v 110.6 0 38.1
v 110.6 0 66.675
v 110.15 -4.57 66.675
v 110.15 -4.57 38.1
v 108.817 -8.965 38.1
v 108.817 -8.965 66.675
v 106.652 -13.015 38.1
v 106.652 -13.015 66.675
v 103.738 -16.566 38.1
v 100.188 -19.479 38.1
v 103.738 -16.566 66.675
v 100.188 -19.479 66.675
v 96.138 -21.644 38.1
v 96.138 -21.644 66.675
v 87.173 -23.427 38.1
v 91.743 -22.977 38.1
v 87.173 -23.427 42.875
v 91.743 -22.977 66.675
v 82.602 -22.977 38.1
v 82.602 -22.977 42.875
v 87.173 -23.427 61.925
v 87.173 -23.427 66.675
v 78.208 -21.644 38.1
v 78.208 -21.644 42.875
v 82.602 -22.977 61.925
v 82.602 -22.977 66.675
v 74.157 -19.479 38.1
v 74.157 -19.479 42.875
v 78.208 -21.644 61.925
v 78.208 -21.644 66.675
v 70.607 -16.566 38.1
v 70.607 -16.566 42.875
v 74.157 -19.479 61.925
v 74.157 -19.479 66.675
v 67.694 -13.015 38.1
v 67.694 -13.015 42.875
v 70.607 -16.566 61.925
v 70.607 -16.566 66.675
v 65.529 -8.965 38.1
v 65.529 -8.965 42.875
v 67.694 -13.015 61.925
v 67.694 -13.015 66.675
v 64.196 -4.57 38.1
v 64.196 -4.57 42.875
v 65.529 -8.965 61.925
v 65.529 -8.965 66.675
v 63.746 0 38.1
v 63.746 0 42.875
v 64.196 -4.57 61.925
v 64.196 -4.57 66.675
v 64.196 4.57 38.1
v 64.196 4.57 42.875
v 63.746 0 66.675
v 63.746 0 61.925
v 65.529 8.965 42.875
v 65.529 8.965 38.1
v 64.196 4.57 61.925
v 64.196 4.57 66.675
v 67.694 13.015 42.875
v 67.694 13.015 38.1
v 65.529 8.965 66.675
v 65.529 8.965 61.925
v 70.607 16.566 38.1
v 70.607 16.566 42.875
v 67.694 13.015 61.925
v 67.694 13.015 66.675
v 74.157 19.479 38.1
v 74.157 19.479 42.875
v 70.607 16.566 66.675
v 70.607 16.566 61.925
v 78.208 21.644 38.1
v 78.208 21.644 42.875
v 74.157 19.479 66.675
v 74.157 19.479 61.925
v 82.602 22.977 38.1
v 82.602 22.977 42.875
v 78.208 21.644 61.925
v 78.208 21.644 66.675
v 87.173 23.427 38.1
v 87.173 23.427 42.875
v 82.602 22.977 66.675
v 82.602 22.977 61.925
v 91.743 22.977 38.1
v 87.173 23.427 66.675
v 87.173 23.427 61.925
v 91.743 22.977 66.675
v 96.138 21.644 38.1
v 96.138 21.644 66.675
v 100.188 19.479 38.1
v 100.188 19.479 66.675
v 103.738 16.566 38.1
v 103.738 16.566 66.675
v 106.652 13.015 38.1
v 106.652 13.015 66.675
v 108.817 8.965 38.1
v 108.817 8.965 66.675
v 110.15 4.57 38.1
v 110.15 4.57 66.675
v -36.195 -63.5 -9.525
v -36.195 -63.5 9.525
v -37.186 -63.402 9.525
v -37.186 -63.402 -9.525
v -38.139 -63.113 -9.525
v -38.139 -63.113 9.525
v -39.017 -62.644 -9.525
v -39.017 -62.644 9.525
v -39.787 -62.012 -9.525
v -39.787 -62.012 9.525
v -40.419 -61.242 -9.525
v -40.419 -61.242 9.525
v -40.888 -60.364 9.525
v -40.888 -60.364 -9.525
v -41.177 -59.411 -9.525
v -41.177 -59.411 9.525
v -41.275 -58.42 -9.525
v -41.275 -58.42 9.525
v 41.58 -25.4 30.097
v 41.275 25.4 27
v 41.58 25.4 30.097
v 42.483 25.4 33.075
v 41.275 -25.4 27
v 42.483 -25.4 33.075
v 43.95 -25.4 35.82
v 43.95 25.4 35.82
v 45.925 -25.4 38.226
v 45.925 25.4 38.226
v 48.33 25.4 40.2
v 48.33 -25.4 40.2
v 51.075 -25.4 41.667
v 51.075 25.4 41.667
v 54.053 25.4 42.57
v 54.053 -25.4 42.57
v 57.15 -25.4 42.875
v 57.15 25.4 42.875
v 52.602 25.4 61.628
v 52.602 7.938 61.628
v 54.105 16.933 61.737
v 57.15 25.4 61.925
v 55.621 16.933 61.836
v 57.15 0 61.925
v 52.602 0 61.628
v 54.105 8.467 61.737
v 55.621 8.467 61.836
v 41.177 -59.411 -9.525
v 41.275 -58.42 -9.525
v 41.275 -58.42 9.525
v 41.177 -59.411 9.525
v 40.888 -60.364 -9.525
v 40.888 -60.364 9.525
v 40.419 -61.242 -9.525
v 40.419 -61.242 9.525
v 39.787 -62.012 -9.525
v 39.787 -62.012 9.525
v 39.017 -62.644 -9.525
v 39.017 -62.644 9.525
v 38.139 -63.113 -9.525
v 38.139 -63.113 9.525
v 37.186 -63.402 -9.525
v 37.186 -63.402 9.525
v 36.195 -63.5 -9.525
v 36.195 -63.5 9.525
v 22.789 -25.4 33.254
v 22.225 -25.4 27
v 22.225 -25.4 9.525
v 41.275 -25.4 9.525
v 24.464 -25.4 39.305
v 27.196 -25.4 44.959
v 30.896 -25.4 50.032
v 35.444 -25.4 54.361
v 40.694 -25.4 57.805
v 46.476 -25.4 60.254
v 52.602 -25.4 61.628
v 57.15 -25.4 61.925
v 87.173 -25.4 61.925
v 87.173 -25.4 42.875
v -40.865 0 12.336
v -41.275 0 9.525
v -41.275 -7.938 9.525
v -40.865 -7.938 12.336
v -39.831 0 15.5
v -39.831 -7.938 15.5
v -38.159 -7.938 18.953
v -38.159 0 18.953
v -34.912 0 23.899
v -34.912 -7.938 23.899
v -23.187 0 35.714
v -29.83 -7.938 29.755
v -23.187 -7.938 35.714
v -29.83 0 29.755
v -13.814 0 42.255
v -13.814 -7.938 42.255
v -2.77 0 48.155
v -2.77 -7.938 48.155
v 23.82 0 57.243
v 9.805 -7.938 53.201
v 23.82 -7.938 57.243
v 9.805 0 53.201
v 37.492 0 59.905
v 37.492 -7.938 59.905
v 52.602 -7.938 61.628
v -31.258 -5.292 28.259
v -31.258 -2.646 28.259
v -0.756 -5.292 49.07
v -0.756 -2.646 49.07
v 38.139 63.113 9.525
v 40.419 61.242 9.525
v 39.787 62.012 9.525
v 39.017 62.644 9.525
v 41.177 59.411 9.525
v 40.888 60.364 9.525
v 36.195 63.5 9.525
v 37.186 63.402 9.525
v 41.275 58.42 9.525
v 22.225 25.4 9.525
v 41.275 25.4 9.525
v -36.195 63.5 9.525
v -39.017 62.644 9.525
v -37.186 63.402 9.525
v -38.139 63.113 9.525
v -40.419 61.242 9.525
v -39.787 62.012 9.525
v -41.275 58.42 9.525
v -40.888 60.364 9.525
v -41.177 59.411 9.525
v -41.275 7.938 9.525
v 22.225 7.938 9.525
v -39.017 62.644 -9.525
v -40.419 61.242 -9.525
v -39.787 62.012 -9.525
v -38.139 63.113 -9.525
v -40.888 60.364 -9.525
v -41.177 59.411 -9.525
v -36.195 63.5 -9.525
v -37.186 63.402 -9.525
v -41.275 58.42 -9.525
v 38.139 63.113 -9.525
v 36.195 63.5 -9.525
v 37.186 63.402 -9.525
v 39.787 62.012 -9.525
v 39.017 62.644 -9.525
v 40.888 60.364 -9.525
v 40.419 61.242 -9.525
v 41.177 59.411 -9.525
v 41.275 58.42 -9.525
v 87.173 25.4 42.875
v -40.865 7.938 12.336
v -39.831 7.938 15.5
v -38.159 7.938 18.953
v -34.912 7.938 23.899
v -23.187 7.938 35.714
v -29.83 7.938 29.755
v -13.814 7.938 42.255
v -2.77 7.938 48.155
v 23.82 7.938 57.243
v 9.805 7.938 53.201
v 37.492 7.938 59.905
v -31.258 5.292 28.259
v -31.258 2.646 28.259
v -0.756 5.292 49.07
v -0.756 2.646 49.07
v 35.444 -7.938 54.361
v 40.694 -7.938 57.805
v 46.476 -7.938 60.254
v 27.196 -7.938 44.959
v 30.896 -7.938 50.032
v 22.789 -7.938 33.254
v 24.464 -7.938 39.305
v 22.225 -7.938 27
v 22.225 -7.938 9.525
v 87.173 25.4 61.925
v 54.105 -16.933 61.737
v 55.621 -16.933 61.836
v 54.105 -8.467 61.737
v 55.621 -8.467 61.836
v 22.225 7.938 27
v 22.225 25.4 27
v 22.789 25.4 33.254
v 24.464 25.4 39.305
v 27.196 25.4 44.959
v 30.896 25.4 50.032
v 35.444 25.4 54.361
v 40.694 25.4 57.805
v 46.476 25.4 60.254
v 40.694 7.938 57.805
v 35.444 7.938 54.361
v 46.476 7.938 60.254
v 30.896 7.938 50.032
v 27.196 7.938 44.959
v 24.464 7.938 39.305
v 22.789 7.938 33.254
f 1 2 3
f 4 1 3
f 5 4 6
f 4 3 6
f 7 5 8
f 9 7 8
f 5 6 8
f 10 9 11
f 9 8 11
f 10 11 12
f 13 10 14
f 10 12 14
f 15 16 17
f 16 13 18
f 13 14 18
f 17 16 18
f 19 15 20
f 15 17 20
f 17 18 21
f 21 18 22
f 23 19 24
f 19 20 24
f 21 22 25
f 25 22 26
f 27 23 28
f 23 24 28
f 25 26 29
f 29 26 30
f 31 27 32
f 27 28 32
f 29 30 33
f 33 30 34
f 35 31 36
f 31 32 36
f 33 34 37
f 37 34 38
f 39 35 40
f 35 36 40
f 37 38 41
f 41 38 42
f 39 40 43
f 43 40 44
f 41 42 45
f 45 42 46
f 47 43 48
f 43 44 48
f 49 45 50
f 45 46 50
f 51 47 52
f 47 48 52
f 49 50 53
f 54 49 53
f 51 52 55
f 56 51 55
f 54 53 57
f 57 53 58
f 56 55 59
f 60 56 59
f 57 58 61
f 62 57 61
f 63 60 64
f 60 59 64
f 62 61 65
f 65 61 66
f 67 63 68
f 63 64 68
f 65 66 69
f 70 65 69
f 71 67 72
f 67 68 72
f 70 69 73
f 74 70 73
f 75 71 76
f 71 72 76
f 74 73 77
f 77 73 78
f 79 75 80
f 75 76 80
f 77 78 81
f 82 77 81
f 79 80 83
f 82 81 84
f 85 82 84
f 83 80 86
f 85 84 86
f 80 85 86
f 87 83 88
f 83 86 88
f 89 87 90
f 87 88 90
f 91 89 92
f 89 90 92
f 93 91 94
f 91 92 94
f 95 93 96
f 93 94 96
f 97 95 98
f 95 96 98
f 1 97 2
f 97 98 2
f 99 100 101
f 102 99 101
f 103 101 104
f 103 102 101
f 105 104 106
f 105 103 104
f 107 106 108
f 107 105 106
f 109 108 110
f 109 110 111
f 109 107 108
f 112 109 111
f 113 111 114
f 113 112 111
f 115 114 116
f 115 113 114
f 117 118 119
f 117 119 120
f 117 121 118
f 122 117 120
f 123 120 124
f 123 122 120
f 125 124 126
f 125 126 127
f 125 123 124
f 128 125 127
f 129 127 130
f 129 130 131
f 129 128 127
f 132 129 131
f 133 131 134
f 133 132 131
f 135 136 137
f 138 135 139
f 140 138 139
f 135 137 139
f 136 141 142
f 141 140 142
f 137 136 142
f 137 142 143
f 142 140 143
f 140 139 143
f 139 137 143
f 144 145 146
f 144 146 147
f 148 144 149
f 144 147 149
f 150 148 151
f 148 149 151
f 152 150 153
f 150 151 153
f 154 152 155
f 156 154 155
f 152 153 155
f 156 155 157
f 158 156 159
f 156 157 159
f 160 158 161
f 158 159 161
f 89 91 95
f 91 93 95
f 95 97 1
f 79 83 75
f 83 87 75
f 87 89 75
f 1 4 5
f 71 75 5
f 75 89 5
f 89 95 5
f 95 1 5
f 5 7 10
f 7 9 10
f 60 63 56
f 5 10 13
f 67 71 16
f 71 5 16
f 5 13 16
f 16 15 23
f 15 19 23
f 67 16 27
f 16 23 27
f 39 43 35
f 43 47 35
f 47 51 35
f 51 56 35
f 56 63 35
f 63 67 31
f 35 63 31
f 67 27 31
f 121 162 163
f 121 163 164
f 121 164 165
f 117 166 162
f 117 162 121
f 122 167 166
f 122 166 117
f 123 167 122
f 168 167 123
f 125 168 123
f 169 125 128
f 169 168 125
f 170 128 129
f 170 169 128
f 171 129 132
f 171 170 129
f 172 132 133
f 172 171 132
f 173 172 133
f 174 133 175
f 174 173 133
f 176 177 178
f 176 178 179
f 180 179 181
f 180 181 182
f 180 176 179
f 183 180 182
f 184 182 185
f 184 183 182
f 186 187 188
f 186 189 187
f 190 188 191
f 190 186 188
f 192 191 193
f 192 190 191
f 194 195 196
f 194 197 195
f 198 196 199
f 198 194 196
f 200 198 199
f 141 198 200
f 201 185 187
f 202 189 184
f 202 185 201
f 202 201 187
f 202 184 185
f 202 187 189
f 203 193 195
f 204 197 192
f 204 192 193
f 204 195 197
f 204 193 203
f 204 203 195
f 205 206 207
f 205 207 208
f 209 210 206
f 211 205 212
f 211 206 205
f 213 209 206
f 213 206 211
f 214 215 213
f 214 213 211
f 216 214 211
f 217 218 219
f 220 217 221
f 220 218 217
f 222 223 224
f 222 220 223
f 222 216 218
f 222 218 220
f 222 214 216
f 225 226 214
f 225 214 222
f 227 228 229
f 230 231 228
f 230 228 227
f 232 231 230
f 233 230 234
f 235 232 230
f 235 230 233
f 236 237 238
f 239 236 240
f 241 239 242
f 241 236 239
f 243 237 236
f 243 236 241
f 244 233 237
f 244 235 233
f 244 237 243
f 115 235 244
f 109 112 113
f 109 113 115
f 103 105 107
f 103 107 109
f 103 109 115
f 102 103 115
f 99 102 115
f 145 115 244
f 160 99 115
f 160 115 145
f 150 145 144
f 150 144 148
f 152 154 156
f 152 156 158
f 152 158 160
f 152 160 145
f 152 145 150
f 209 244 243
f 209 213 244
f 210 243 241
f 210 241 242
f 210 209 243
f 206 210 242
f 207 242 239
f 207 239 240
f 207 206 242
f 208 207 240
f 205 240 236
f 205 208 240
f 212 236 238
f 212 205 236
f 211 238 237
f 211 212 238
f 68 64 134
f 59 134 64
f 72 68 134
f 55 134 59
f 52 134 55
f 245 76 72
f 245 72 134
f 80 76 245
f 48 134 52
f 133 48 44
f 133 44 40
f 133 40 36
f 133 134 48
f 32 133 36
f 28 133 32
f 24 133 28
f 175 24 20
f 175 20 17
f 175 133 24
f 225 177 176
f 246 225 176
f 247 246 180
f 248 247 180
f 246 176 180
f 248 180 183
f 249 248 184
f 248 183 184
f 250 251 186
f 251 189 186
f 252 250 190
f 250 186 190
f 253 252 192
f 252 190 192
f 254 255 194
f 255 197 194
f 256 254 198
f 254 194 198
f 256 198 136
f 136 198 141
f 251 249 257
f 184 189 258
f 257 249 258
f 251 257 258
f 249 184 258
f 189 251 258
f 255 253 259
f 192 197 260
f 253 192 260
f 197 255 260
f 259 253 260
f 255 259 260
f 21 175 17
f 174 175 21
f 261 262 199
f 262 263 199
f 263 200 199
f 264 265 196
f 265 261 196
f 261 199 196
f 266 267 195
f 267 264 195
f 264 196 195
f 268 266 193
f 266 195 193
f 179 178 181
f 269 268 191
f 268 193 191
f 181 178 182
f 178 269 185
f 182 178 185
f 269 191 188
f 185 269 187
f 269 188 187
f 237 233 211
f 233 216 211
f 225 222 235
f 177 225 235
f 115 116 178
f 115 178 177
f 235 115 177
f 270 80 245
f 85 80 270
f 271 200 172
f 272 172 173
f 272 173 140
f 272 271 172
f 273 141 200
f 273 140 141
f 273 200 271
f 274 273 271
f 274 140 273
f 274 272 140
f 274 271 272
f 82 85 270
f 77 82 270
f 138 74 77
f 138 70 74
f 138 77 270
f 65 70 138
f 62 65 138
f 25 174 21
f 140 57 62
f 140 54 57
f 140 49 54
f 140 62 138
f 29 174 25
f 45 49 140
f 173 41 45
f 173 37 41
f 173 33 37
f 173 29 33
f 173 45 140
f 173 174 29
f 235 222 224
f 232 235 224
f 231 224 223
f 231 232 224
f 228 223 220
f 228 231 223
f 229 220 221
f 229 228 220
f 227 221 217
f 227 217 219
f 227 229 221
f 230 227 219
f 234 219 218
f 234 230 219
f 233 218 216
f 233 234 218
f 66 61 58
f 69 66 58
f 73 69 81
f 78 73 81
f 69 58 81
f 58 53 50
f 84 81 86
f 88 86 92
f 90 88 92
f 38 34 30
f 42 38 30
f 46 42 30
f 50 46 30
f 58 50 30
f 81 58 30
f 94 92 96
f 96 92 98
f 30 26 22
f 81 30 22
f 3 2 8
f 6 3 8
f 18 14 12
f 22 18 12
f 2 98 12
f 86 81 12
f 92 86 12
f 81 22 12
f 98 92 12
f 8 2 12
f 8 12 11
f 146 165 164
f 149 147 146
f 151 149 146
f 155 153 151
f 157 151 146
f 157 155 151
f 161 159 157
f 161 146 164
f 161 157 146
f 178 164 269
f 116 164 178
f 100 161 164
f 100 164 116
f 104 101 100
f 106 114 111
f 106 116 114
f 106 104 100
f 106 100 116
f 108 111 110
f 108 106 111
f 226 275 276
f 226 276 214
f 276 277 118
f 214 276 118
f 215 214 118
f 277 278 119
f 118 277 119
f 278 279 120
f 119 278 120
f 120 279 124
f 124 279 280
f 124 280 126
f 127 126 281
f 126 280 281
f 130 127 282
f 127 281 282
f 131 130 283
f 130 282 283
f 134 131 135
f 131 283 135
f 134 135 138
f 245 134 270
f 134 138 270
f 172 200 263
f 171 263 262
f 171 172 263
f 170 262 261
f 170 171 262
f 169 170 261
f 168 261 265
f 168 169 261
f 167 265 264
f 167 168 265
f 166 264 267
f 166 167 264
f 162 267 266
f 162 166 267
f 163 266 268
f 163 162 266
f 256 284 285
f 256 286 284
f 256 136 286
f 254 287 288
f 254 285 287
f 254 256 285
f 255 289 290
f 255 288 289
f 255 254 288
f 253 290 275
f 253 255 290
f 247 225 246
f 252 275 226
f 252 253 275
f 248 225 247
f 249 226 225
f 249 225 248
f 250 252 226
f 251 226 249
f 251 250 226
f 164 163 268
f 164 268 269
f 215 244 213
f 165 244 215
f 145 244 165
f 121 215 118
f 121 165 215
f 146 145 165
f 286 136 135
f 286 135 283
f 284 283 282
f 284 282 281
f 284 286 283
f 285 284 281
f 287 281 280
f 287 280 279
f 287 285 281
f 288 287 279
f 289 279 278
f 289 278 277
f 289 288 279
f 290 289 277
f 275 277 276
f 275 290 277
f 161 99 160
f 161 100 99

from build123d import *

# Parameters (mm, degrees)
F1_DEPTH = 63.5
F0_W     = 27.3727922164
F0_H     = 19.05
F2_DEPTH = 25.4
F3_DEPTH = 7.9375
F5_R     = 5.08


with BuildPart() as f1:
    # F0 (on Front) → F1 (new body, symmetric)
    with BuildSketch(Plane.XZ):
        Polygon((22.225, 9.525), (-41.275, 9.525), (-41.275, -9.525), (41.275, -9.525), (41.275, 9.525), align=None)
    extrude(amount=F1_DEPTH, both=True)

    # F0 (on Front) → F2 (join, symmetric)
    with BuildSketch(Plane.XZ):
        with Locations((73.4864038918, 52.4002)):
            Rectangle(F0_W, F0_H)
        with BuildLine():
            Line((22.225, 27.0002), (22.225, 9.525))
            Line((22.225, 9.525), (41.275, 9.525))
            Line((41.275, 9.525), (41.275, 27.0002))
            ThreePointArc((41.275, 27.0002), (45.9246798487, 38.2255201513), (57.15, 42.8752))
            Line((57.15, 42.8752), (59.8000077836, 42.8752))
            Line((59.8000077836, 42.8752), (59.8000077836, 61.9252))
            Line((59.8000077836, 61.9252), (57.15, 61.9252))
            add(Edge.make_bspline(
                [(52.6023702137, 61.6278578522), (54.0985072201, 61.7416652267), (55.6143415744, 61.8409632906), (57.15, 61.9252)],
                knots=[109.0172906115, 109.0172906115, 109.0172906115, 109.0172906115, 111.5045361635, 111.5045361635, 111.5045361635, 111.5045361635], degree=3))
            ThreePointArc((52.6023702137, 61.6278578522), (30.8956518336, 50.032022059), (22.225, 27.0002))
        make_face()
    extrude(amount=F2_DEPTH, both=True)

    # F0 (on Front) → F3 (join, symmetric)
    with BuildSketch(Plane.XZ):
        with BuildLine():
            add(Edge.make_bspline(
                [(-41.275, 9.525), (-40.7097081479, 23.7773233991), (-12.9741076271, 56.6396203166), (52.6023702137, 61.6278578522)],
                knots=[0, 0, 0, 0, 109.0172906115, 109.0172906115, 109.0172906115, 109.0172906115], degree=3))
            Line((-41.275, 9.525), (22.225, 9.525))
            Line((22.225, 9.525), (22.225, 27.0002))
            ThreePointArc((22.225, 27.0002), (30.8956518336, 50.032022059), (52.6023702137, 61.6278578522))
        make_face()
    extrude(amount=F3_DEPTH, both=True)

    # F0 (on Front) → F4 (revolve)
    with BuildSketch(Plane.XZ):
        Polygon((87.1728, 66.675), (87.1728, 61.9252), (87.1728, 42.8752), (87.1728, 38.1), (110.6000077836, 38.1), (110.6000077836, 66.675), align=None)
    revolve(axis=Axis((87.1728, 0, 52.3875), (0, 0, -1)))

    # F5
    f5_edges = [f1.edges().sort_by_distance(p)[0] for p in [
        (-41.275, -63.5, 0),
        (41.275, -63.5, 0),
        (41.275, 63.5, 0),
        (-41.275, 63.5, 0),
    ]]
    fillet(f5_edges, radius=F5_R)


solid = f1.part
